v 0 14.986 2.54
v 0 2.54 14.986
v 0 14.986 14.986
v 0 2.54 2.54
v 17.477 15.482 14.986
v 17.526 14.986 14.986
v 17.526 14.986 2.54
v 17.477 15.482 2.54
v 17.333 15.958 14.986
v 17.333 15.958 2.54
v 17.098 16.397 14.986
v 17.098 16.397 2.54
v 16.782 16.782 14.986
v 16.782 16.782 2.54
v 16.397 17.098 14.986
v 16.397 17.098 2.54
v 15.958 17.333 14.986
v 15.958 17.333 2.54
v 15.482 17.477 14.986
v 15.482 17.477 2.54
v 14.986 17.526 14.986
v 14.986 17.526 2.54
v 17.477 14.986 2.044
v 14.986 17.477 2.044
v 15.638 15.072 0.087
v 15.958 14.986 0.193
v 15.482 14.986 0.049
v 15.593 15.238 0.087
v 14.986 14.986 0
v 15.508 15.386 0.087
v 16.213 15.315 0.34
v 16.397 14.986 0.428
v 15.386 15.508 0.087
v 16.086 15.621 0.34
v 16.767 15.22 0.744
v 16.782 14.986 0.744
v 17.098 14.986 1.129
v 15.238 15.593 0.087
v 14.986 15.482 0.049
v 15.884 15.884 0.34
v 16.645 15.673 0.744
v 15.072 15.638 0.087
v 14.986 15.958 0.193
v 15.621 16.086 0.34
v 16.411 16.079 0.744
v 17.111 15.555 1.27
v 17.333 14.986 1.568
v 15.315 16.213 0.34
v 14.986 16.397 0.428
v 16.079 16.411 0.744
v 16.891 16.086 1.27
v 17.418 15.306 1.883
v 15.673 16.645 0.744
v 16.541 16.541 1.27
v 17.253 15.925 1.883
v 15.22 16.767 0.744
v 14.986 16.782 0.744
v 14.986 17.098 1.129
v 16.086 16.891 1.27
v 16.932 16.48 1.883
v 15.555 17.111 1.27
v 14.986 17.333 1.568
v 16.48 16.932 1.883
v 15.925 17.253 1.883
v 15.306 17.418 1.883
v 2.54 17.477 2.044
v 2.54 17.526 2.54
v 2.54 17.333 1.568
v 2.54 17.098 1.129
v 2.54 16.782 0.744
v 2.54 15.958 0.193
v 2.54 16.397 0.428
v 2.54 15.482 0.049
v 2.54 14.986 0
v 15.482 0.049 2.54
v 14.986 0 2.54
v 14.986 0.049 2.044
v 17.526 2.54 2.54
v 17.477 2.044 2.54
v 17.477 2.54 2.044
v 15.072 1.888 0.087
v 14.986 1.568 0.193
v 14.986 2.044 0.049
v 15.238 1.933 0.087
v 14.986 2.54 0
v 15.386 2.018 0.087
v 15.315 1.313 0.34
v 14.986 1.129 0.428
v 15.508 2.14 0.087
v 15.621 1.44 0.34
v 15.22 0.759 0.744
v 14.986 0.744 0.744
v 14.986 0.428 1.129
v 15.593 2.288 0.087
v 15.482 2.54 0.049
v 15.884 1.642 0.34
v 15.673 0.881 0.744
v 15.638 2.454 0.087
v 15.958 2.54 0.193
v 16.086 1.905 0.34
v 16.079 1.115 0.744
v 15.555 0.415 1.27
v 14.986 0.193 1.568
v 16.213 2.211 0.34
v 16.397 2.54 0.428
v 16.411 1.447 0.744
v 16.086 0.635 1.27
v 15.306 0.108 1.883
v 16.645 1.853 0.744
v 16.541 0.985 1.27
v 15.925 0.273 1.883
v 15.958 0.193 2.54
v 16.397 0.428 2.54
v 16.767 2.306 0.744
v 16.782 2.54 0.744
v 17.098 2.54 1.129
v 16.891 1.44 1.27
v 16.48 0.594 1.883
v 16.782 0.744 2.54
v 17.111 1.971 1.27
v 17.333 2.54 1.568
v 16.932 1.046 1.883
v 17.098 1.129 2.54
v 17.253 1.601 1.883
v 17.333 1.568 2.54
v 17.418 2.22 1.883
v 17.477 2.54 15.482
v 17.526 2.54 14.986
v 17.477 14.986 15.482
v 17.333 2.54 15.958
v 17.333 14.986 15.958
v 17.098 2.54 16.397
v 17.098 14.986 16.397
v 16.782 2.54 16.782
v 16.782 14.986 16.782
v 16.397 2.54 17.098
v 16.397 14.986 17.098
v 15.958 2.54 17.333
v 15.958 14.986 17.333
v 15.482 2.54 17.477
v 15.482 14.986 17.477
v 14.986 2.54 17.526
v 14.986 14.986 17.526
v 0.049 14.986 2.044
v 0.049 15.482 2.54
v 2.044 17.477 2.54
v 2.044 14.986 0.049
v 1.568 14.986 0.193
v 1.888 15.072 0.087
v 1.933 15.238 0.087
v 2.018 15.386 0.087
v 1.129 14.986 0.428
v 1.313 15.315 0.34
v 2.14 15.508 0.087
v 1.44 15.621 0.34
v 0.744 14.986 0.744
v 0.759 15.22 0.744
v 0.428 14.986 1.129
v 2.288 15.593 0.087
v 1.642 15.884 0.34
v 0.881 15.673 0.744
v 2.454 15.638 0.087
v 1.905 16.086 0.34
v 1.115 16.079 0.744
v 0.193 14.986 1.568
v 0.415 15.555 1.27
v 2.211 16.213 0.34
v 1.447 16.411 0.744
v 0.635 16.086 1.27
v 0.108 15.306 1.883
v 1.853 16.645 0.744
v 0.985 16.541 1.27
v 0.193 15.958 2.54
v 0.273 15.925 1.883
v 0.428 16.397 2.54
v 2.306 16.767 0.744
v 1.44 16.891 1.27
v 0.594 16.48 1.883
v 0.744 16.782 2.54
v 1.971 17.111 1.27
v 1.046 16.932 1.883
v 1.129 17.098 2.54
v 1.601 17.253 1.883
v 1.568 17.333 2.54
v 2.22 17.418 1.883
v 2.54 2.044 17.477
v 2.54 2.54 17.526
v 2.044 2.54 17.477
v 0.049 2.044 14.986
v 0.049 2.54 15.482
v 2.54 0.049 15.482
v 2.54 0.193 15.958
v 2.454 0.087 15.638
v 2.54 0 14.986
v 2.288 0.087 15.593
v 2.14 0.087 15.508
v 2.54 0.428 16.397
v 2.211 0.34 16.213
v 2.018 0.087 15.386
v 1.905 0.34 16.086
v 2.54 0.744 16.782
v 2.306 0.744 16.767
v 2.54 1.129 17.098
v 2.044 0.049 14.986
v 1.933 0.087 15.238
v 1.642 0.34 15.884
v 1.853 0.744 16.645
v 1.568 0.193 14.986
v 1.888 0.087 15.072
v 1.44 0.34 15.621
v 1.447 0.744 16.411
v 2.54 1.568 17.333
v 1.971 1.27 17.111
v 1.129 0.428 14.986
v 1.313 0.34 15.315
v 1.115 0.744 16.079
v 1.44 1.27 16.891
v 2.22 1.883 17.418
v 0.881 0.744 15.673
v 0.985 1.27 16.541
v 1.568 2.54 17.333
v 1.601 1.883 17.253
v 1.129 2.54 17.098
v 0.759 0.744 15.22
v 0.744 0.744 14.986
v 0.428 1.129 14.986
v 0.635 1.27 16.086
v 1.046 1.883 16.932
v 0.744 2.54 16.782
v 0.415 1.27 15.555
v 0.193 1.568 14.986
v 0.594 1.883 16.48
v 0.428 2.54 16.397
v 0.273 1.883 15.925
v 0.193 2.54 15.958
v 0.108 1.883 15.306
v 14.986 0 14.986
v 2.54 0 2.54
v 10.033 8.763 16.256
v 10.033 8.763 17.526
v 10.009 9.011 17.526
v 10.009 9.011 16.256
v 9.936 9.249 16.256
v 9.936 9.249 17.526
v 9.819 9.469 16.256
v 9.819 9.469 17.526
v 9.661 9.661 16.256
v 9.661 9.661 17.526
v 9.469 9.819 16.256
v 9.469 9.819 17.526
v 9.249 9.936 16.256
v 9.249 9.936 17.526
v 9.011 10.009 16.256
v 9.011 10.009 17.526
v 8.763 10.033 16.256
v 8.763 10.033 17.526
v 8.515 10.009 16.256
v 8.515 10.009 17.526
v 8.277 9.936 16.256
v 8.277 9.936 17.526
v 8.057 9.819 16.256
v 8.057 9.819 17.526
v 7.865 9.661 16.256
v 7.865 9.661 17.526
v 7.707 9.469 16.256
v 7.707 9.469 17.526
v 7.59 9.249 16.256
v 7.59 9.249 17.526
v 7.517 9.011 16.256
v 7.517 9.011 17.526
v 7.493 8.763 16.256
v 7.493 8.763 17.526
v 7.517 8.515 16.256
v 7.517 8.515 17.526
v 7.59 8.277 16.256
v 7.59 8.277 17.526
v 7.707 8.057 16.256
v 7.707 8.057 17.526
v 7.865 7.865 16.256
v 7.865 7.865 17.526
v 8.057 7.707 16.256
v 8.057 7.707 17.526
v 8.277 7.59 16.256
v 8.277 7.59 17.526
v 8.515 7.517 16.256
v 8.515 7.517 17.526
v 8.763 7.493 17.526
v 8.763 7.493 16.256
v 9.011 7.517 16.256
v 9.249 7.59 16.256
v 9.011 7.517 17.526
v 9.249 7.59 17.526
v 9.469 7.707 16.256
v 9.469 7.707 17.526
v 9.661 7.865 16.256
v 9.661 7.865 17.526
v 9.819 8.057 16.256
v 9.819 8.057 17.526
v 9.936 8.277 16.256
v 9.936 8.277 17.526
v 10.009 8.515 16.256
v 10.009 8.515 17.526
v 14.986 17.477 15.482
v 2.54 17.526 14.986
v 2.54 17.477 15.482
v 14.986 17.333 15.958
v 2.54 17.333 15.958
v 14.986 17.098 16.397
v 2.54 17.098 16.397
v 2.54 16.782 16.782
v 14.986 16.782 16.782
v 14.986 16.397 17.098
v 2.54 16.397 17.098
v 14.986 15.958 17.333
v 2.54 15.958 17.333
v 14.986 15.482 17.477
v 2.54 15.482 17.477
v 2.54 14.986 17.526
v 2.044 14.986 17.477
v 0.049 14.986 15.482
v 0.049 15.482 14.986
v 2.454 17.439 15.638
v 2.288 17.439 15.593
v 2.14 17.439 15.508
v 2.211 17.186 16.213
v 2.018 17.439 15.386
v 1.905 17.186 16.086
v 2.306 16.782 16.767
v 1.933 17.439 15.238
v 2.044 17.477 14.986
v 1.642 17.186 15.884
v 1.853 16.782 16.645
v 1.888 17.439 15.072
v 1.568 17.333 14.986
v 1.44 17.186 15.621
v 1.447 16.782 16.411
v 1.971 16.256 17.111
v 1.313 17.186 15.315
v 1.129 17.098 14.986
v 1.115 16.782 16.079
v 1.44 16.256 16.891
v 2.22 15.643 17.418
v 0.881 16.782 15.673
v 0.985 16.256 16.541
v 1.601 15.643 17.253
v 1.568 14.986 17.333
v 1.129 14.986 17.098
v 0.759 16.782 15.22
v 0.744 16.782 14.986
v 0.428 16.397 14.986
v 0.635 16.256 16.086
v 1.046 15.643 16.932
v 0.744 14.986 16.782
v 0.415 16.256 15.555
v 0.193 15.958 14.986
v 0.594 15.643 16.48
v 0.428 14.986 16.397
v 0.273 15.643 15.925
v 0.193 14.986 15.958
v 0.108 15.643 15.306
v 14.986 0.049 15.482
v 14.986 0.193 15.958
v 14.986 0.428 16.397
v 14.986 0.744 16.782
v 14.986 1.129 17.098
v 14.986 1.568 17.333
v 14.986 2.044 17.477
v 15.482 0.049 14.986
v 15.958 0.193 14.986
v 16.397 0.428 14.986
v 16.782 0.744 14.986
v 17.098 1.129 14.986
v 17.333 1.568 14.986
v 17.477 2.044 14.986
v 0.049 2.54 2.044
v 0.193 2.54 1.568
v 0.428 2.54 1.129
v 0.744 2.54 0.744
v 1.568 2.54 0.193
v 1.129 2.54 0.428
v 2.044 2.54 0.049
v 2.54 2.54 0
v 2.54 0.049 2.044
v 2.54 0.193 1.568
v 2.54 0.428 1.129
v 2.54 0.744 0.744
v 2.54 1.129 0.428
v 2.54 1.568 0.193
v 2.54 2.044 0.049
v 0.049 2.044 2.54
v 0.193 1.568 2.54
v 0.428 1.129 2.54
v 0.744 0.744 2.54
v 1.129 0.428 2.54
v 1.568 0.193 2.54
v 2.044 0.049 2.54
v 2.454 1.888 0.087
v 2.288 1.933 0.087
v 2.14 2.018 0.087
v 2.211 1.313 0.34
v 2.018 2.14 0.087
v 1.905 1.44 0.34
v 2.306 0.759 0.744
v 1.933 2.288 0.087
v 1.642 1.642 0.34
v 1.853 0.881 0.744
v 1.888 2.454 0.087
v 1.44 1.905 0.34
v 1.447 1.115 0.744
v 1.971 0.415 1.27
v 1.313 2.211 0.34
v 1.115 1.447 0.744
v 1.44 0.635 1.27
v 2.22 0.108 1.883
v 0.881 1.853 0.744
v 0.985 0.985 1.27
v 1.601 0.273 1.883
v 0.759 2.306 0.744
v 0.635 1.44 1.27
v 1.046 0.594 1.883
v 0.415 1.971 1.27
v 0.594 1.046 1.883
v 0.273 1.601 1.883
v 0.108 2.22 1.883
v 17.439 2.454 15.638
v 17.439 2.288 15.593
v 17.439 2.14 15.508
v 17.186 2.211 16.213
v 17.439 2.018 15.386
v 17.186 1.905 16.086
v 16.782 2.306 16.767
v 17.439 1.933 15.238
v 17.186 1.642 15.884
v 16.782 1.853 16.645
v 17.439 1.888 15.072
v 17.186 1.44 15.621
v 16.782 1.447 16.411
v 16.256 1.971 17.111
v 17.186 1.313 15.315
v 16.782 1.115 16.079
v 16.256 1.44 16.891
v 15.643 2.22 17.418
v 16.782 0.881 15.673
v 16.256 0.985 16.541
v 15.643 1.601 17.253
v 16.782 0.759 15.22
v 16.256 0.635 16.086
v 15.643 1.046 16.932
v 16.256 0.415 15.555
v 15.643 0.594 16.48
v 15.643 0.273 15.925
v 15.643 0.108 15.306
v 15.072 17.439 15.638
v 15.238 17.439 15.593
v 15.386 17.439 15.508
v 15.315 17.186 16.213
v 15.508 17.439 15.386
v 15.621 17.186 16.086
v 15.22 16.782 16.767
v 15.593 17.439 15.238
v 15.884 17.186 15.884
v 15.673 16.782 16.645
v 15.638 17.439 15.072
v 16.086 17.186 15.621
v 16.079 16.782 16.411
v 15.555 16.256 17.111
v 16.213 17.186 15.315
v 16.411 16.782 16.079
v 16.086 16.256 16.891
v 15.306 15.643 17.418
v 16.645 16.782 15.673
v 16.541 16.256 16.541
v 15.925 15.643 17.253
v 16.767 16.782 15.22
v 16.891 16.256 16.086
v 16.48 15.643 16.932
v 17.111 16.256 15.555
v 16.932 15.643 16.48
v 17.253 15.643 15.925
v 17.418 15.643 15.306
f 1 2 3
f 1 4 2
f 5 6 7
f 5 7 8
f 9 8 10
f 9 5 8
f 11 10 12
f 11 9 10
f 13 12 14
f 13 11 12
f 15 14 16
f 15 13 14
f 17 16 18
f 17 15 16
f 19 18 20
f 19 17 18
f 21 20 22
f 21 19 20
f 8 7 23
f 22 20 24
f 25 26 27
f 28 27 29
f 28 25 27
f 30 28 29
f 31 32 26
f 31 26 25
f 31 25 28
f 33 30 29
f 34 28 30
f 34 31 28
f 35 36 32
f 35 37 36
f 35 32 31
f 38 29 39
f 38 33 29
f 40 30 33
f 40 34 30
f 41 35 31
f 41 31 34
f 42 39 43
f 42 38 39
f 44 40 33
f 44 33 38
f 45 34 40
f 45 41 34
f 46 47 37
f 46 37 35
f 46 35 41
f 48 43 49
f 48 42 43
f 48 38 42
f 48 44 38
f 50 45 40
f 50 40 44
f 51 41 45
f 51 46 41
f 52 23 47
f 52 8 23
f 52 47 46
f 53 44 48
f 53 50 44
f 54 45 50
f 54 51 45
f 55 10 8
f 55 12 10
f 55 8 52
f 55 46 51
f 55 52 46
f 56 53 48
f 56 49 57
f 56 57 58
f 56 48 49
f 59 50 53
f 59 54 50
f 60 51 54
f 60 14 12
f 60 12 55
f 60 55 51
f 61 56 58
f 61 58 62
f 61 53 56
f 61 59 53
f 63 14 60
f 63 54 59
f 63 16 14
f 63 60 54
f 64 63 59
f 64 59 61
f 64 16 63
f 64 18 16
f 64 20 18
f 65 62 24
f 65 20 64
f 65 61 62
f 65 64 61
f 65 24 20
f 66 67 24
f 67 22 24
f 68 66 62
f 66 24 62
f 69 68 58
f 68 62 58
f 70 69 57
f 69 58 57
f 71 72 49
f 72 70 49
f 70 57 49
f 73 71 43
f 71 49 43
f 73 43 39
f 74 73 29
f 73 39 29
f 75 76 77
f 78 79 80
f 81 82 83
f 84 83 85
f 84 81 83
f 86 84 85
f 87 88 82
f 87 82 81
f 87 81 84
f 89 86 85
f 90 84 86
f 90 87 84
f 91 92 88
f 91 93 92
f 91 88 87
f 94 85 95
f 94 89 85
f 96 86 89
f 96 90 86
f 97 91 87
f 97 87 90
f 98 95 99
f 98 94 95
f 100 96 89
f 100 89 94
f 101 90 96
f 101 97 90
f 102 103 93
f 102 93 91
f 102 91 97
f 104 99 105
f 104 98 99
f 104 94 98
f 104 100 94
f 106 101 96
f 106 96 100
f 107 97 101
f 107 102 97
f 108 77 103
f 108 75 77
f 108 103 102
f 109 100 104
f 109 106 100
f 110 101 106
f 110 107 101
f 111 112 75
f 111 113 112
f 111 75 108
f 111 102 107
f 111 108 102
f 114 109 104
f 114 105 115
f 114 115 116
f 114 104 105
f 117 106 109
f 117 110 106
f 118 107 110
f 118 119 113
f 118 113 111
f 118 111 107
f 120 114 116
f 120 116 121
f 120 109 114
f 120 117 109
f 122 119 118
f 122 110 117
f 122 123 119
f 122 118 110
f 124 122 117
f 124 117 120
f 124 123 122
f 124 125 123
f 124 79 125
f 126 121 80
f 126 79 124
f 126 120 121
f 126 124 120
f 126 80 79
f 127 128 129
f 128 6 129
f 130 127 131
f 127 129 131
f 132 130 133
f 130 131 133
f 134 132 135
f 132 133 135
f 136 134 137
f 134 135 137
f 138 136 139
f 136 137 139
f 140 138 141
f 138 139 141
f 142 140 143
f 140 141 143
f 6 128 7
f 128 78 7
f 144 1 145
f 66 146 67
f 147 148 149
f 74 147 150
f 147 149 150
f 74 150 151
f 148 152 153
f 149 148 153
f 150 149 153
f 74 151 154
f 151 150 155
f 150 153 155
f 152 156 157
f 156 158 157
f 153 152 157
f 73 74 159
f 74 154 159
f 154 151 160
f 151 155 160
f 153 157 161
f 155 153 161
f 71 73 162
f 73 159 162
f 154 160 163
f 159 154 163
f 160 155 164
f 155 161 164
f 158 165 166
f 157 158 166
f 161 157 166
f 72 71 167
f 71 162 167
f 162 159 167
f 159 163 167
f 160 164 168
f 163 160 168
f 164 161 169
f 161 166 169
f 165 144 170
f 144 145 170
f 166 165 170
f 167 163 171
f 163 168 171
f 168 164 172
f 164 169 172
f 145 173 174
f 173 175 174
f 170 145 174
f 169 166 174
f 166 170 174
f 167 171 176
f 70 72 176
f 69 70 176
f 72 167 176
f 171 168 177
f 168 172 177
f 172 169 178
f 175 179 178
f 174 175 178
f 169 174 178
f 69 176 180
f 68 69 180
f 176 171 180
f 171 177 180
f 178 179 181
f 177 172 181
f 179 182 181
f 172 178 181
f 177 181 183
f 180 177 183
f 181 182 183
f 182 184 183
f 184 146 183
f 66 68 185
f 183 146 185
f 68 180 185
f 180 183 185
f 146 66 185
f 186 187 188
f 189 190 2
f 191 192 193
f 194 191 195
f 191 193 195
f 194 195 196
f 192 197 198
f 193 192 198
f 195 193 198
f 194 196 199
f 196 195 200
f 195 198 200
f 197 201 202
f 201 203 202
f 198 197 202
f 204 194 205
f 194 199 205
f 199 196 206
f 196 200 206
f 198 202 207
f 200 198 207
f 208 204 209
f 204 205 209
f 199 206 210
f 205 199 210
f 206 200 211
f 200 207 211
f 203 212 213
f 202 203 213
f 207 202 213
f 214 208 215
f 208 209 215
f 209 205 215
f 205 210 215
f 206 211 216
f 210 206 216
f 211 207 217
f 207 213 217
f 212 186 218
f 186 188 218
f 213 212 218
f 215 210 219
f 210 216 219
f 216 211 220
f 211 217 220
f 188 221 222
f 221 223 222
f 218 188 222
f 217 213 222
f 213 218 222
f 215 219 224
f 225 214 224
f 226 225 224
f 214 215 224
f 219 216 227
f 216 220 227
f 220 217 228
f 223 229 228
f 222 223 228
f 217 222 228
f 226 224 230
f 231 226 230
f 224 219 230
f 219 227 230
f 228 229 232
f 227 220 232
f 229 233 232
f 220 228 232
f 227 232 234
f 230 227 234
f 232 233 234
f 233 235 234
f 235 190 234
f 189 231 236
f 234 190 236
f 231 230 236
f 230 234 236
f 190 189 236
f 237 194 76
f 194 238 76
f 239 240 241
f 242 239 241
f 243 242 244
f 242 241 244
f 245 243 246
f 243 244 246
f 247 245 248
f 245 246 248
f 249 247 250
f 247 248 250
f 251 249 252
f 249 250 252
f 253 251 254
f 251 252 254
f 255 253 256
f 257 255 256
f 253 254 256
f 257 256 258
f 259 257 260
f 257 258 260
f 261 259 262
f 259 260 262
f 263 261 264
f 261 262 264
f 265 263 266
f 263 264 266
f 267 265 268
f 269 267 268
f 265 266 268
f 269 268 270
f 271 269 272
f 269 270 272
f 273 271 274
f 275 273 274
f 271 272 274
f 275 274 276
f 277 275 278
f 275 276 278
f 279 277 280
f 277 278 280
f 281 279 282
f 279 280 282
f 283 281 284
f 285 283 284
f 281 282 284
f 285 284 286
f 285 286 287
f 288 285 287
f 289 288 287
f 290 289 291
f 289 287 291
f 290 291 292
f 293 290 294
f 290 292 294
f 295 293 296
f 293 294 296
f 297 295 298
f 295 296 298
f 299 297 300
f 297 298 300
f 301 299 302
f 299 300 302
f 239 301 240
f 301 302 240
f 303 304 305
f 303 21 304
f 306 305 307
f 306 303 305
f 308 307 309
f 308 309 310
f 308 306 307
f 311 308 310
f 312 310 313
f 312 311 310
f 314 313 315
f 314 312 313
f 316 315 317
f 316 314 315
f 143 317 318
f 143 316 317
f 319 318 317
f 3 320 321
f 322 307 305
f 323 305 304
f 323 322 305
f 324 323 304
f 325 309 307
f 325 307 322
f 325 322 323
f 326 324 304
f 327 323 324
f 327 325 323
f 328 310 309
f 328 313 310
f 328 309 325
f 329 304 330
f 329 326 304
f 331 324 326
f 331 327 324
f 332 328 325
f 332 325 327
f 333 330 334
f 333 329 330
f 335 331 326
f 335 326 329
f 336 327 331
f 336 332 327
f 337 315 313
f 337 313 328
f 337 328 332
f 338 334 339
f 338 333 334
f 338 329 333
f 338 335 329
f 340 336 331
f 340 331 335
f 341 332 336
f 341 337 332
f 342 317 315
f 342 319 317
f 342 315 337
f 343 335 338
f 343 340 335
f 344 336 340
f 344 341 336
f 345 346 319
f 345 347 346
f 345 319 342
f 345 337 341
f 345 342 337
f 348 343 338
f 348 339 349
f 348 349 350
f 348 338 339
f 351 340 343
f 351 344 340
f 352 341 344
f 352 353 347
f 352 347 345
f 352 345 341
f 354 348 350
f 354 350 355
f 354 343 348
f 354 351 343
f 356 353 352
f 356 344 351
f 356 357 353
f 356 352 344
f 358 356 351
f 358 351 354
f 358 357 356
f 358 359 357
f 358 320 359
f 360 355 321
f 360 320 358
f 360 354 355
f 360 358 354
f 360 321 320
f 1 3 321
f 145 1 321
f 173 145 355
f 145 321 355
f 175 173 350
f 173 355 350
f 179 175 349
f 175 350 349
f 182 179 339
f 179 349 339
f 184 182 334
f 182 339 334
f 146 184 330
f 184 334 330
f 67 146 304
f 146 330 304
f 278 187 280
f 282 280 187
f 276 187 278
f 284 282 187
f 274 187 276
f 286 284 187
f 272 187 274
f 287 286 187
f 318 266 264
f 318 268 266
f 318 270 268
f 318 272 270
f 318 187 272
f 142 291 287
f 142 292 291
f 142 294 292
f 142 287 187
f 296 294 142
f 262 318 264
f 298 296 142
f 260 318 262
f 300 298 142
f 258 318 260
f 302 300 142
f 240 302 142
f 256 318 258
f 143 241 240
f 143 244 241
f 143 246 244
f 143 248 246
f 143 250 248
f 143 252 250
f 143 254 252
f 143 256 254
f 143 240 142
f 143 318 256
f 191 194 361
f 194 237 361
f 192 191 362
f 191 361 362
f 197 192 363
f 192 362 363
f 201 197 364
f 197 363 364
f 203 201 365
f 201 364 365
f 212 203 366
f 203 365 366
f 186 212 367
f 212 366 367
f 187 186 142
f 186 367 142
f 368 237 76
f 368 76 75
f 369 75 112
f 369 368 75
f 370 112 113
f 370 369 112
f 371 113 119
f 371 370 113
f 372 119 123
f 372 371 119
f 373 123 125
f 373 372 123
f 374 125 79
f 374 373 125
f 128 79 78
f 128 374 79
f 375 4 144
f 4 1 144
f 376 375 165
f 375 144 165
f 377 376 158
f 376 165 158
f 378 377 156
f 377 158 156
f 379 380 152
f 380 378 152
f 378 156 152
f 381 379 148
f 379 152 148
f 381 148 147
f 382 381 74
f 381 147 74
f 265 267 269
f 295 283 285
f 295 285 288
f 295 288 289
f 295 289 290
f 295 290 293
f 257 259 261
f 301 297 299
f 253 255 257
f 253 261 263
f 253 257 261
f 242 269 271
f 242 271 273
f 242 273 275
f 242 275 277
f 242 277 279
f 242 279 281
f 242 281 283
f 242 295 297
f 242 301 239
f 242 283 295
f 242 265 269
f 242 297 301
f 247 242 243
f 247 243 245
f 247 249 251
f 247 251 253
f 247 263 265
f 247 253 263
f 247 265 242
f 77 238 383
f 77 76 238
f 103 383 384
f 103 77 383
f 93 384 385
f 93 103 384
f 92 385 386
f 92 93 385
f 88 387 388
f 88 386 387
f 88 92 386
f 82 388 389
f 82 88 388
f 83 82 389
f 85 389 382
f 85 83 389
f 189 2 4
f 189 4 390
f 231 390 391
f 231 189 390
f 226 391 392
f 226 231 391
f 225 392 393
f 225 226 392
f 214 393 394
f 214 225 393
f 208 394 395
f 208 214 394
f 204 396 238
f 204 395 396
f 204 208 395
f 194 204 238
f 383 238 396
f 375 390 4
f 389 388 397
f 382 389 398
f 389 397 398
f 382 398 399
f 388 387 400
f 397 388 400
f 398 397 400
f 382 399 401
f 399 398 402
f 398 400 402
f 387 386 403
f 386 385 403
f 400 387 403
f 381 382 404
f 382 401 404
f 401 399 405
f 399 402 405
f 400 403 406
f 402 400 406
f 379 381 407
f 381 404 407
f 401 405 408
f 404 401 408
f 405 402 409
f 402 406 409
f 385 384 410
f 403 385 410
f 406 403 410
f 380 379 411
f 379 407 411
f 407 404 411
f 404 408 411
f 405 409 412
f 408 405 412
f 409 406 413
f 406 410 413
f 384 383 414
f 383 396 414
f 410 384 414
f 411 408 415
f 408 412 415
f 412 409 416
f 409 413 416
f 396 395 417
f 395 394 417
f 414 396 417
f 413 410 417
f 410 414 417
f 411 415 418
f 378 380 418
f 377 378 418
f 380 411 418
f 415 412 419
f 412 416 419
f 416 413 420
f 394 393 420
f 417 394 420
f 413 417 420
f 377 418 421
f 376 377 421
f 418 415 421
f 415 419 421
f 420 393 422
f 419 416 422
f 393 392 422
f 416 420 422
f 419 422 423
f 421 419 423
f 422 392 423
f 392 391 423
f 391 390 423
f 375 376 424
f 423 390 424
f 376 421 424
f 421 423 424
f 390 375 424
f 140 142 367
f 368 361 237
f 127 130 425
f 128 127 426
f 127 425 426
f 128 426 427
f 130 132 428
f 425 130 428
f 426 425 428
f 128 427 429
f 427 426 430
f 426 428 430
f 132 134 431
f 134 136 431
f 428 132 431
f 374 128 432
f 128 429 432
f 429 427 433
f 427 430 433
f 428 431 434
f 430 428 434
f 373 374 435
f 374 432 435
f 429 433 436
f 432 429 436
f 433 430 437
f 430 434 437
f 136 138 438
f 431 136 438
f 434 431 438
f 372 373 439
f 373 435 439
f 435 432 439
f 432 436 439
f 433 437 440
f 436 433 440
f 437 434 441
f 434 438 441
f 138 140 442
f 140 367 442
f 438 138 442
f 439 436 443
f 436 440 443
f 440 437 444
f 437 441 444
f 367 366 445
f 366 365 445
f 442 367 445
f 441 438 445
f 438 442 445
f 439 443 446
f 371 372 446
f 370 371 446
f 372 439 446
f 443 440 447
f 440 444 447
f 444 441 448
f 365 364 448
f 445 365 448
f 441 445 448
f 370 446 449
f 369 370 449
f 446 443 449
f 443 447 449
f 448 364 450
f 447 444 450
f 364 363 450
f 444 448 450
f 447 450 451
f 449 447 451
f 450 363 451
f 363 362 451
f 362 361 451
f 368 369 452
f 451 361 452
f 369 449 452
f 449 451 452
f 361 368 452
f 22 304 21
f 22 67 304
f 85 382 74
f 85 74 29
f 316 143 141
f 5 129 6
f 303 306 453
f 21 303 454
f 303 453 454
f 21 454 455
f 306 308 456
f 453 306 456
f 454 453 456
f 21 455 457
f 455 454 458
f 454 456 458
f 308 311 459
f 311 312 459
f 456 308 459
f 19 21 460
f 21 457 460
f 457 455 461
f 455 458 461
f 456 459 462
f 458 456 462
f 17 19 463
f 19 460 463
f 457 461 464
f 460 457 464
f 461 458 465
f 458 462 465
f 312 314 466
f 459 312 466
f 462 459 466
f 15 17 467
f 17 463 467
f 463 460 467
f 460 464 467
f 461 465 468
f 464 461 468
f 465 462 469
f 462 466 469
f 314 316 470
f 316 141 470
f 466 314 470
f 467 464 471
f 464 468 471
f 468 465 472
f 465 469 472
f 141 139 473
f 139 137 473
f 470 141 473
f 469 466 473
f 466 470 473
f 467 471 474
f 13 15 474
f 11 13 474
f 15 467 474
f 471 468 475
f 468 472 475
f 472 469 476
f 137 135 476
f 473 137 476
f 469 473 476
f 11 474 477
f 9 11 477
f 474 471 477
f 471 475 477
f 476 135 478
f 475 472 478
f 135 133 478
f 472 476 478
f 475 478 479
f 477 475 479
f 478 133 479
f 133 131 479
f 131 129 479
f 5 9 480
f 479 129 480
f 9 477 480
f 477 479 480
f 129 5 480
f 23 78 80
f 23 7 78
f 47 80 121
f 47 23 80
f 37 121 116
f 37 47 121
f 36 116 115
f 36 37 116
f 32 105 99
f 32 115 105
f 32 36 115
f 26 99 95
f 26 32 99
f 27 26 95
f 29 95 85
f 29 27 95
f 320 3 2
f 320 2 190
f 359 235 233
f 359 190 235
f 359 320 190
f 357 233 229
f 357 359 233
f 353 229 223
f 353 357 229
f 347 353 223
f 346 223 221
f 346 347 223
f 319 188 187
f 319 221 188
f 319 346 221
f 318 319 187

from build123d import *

# Parameters (mm, degrees)
F0_W     = 17.526
F0_H     = 17.526
F1_DEPTH = 17.526
F2_R     = 2.54
F3_R     = 1.27
F4_DEPTH = 1.27


with BuildPart() as f1:
    # F0 (on Top) → F1 (new body)
    with BuildSketch(Plane.XY):
        with Locations((8.763, 8.763)):
            Rectangle(F0_W, F0_H)
    extrude(amount=F1_DEPTH)

    # F2
    f2_edges = [f1.edges().sort_by_distance(p)[0] for p in [
        (0, 8.763, 17.526),
        (8.763, 0, 17.526),
        (17.526, 8.763, 17.526),
        (8.763, 17.526, 17.526),
        (0, 0, 8.763),
        (17.526, 0, 8.763),
        (8.763, 0, 0),
        (17.526, 17.526, 8.763),
        (17.526, 8.763, 0),
        (0, 17.526, 8.763),
        (0, 8.763, 0),
        (8.763, 17.526, 0),
    ]]
    fillet(f2_edges, radius=F2_R)

    # F3 (on face) → F4 (cut)
    with BuildSketch(Plane.XY.offset(17.526)):
        with Locations((8.763, 8.763)):
            Circle(F3_R)
    extrude(amount=-F4_DEPTH, mode=Mode.SUBTRACT)


solid = f1.part
